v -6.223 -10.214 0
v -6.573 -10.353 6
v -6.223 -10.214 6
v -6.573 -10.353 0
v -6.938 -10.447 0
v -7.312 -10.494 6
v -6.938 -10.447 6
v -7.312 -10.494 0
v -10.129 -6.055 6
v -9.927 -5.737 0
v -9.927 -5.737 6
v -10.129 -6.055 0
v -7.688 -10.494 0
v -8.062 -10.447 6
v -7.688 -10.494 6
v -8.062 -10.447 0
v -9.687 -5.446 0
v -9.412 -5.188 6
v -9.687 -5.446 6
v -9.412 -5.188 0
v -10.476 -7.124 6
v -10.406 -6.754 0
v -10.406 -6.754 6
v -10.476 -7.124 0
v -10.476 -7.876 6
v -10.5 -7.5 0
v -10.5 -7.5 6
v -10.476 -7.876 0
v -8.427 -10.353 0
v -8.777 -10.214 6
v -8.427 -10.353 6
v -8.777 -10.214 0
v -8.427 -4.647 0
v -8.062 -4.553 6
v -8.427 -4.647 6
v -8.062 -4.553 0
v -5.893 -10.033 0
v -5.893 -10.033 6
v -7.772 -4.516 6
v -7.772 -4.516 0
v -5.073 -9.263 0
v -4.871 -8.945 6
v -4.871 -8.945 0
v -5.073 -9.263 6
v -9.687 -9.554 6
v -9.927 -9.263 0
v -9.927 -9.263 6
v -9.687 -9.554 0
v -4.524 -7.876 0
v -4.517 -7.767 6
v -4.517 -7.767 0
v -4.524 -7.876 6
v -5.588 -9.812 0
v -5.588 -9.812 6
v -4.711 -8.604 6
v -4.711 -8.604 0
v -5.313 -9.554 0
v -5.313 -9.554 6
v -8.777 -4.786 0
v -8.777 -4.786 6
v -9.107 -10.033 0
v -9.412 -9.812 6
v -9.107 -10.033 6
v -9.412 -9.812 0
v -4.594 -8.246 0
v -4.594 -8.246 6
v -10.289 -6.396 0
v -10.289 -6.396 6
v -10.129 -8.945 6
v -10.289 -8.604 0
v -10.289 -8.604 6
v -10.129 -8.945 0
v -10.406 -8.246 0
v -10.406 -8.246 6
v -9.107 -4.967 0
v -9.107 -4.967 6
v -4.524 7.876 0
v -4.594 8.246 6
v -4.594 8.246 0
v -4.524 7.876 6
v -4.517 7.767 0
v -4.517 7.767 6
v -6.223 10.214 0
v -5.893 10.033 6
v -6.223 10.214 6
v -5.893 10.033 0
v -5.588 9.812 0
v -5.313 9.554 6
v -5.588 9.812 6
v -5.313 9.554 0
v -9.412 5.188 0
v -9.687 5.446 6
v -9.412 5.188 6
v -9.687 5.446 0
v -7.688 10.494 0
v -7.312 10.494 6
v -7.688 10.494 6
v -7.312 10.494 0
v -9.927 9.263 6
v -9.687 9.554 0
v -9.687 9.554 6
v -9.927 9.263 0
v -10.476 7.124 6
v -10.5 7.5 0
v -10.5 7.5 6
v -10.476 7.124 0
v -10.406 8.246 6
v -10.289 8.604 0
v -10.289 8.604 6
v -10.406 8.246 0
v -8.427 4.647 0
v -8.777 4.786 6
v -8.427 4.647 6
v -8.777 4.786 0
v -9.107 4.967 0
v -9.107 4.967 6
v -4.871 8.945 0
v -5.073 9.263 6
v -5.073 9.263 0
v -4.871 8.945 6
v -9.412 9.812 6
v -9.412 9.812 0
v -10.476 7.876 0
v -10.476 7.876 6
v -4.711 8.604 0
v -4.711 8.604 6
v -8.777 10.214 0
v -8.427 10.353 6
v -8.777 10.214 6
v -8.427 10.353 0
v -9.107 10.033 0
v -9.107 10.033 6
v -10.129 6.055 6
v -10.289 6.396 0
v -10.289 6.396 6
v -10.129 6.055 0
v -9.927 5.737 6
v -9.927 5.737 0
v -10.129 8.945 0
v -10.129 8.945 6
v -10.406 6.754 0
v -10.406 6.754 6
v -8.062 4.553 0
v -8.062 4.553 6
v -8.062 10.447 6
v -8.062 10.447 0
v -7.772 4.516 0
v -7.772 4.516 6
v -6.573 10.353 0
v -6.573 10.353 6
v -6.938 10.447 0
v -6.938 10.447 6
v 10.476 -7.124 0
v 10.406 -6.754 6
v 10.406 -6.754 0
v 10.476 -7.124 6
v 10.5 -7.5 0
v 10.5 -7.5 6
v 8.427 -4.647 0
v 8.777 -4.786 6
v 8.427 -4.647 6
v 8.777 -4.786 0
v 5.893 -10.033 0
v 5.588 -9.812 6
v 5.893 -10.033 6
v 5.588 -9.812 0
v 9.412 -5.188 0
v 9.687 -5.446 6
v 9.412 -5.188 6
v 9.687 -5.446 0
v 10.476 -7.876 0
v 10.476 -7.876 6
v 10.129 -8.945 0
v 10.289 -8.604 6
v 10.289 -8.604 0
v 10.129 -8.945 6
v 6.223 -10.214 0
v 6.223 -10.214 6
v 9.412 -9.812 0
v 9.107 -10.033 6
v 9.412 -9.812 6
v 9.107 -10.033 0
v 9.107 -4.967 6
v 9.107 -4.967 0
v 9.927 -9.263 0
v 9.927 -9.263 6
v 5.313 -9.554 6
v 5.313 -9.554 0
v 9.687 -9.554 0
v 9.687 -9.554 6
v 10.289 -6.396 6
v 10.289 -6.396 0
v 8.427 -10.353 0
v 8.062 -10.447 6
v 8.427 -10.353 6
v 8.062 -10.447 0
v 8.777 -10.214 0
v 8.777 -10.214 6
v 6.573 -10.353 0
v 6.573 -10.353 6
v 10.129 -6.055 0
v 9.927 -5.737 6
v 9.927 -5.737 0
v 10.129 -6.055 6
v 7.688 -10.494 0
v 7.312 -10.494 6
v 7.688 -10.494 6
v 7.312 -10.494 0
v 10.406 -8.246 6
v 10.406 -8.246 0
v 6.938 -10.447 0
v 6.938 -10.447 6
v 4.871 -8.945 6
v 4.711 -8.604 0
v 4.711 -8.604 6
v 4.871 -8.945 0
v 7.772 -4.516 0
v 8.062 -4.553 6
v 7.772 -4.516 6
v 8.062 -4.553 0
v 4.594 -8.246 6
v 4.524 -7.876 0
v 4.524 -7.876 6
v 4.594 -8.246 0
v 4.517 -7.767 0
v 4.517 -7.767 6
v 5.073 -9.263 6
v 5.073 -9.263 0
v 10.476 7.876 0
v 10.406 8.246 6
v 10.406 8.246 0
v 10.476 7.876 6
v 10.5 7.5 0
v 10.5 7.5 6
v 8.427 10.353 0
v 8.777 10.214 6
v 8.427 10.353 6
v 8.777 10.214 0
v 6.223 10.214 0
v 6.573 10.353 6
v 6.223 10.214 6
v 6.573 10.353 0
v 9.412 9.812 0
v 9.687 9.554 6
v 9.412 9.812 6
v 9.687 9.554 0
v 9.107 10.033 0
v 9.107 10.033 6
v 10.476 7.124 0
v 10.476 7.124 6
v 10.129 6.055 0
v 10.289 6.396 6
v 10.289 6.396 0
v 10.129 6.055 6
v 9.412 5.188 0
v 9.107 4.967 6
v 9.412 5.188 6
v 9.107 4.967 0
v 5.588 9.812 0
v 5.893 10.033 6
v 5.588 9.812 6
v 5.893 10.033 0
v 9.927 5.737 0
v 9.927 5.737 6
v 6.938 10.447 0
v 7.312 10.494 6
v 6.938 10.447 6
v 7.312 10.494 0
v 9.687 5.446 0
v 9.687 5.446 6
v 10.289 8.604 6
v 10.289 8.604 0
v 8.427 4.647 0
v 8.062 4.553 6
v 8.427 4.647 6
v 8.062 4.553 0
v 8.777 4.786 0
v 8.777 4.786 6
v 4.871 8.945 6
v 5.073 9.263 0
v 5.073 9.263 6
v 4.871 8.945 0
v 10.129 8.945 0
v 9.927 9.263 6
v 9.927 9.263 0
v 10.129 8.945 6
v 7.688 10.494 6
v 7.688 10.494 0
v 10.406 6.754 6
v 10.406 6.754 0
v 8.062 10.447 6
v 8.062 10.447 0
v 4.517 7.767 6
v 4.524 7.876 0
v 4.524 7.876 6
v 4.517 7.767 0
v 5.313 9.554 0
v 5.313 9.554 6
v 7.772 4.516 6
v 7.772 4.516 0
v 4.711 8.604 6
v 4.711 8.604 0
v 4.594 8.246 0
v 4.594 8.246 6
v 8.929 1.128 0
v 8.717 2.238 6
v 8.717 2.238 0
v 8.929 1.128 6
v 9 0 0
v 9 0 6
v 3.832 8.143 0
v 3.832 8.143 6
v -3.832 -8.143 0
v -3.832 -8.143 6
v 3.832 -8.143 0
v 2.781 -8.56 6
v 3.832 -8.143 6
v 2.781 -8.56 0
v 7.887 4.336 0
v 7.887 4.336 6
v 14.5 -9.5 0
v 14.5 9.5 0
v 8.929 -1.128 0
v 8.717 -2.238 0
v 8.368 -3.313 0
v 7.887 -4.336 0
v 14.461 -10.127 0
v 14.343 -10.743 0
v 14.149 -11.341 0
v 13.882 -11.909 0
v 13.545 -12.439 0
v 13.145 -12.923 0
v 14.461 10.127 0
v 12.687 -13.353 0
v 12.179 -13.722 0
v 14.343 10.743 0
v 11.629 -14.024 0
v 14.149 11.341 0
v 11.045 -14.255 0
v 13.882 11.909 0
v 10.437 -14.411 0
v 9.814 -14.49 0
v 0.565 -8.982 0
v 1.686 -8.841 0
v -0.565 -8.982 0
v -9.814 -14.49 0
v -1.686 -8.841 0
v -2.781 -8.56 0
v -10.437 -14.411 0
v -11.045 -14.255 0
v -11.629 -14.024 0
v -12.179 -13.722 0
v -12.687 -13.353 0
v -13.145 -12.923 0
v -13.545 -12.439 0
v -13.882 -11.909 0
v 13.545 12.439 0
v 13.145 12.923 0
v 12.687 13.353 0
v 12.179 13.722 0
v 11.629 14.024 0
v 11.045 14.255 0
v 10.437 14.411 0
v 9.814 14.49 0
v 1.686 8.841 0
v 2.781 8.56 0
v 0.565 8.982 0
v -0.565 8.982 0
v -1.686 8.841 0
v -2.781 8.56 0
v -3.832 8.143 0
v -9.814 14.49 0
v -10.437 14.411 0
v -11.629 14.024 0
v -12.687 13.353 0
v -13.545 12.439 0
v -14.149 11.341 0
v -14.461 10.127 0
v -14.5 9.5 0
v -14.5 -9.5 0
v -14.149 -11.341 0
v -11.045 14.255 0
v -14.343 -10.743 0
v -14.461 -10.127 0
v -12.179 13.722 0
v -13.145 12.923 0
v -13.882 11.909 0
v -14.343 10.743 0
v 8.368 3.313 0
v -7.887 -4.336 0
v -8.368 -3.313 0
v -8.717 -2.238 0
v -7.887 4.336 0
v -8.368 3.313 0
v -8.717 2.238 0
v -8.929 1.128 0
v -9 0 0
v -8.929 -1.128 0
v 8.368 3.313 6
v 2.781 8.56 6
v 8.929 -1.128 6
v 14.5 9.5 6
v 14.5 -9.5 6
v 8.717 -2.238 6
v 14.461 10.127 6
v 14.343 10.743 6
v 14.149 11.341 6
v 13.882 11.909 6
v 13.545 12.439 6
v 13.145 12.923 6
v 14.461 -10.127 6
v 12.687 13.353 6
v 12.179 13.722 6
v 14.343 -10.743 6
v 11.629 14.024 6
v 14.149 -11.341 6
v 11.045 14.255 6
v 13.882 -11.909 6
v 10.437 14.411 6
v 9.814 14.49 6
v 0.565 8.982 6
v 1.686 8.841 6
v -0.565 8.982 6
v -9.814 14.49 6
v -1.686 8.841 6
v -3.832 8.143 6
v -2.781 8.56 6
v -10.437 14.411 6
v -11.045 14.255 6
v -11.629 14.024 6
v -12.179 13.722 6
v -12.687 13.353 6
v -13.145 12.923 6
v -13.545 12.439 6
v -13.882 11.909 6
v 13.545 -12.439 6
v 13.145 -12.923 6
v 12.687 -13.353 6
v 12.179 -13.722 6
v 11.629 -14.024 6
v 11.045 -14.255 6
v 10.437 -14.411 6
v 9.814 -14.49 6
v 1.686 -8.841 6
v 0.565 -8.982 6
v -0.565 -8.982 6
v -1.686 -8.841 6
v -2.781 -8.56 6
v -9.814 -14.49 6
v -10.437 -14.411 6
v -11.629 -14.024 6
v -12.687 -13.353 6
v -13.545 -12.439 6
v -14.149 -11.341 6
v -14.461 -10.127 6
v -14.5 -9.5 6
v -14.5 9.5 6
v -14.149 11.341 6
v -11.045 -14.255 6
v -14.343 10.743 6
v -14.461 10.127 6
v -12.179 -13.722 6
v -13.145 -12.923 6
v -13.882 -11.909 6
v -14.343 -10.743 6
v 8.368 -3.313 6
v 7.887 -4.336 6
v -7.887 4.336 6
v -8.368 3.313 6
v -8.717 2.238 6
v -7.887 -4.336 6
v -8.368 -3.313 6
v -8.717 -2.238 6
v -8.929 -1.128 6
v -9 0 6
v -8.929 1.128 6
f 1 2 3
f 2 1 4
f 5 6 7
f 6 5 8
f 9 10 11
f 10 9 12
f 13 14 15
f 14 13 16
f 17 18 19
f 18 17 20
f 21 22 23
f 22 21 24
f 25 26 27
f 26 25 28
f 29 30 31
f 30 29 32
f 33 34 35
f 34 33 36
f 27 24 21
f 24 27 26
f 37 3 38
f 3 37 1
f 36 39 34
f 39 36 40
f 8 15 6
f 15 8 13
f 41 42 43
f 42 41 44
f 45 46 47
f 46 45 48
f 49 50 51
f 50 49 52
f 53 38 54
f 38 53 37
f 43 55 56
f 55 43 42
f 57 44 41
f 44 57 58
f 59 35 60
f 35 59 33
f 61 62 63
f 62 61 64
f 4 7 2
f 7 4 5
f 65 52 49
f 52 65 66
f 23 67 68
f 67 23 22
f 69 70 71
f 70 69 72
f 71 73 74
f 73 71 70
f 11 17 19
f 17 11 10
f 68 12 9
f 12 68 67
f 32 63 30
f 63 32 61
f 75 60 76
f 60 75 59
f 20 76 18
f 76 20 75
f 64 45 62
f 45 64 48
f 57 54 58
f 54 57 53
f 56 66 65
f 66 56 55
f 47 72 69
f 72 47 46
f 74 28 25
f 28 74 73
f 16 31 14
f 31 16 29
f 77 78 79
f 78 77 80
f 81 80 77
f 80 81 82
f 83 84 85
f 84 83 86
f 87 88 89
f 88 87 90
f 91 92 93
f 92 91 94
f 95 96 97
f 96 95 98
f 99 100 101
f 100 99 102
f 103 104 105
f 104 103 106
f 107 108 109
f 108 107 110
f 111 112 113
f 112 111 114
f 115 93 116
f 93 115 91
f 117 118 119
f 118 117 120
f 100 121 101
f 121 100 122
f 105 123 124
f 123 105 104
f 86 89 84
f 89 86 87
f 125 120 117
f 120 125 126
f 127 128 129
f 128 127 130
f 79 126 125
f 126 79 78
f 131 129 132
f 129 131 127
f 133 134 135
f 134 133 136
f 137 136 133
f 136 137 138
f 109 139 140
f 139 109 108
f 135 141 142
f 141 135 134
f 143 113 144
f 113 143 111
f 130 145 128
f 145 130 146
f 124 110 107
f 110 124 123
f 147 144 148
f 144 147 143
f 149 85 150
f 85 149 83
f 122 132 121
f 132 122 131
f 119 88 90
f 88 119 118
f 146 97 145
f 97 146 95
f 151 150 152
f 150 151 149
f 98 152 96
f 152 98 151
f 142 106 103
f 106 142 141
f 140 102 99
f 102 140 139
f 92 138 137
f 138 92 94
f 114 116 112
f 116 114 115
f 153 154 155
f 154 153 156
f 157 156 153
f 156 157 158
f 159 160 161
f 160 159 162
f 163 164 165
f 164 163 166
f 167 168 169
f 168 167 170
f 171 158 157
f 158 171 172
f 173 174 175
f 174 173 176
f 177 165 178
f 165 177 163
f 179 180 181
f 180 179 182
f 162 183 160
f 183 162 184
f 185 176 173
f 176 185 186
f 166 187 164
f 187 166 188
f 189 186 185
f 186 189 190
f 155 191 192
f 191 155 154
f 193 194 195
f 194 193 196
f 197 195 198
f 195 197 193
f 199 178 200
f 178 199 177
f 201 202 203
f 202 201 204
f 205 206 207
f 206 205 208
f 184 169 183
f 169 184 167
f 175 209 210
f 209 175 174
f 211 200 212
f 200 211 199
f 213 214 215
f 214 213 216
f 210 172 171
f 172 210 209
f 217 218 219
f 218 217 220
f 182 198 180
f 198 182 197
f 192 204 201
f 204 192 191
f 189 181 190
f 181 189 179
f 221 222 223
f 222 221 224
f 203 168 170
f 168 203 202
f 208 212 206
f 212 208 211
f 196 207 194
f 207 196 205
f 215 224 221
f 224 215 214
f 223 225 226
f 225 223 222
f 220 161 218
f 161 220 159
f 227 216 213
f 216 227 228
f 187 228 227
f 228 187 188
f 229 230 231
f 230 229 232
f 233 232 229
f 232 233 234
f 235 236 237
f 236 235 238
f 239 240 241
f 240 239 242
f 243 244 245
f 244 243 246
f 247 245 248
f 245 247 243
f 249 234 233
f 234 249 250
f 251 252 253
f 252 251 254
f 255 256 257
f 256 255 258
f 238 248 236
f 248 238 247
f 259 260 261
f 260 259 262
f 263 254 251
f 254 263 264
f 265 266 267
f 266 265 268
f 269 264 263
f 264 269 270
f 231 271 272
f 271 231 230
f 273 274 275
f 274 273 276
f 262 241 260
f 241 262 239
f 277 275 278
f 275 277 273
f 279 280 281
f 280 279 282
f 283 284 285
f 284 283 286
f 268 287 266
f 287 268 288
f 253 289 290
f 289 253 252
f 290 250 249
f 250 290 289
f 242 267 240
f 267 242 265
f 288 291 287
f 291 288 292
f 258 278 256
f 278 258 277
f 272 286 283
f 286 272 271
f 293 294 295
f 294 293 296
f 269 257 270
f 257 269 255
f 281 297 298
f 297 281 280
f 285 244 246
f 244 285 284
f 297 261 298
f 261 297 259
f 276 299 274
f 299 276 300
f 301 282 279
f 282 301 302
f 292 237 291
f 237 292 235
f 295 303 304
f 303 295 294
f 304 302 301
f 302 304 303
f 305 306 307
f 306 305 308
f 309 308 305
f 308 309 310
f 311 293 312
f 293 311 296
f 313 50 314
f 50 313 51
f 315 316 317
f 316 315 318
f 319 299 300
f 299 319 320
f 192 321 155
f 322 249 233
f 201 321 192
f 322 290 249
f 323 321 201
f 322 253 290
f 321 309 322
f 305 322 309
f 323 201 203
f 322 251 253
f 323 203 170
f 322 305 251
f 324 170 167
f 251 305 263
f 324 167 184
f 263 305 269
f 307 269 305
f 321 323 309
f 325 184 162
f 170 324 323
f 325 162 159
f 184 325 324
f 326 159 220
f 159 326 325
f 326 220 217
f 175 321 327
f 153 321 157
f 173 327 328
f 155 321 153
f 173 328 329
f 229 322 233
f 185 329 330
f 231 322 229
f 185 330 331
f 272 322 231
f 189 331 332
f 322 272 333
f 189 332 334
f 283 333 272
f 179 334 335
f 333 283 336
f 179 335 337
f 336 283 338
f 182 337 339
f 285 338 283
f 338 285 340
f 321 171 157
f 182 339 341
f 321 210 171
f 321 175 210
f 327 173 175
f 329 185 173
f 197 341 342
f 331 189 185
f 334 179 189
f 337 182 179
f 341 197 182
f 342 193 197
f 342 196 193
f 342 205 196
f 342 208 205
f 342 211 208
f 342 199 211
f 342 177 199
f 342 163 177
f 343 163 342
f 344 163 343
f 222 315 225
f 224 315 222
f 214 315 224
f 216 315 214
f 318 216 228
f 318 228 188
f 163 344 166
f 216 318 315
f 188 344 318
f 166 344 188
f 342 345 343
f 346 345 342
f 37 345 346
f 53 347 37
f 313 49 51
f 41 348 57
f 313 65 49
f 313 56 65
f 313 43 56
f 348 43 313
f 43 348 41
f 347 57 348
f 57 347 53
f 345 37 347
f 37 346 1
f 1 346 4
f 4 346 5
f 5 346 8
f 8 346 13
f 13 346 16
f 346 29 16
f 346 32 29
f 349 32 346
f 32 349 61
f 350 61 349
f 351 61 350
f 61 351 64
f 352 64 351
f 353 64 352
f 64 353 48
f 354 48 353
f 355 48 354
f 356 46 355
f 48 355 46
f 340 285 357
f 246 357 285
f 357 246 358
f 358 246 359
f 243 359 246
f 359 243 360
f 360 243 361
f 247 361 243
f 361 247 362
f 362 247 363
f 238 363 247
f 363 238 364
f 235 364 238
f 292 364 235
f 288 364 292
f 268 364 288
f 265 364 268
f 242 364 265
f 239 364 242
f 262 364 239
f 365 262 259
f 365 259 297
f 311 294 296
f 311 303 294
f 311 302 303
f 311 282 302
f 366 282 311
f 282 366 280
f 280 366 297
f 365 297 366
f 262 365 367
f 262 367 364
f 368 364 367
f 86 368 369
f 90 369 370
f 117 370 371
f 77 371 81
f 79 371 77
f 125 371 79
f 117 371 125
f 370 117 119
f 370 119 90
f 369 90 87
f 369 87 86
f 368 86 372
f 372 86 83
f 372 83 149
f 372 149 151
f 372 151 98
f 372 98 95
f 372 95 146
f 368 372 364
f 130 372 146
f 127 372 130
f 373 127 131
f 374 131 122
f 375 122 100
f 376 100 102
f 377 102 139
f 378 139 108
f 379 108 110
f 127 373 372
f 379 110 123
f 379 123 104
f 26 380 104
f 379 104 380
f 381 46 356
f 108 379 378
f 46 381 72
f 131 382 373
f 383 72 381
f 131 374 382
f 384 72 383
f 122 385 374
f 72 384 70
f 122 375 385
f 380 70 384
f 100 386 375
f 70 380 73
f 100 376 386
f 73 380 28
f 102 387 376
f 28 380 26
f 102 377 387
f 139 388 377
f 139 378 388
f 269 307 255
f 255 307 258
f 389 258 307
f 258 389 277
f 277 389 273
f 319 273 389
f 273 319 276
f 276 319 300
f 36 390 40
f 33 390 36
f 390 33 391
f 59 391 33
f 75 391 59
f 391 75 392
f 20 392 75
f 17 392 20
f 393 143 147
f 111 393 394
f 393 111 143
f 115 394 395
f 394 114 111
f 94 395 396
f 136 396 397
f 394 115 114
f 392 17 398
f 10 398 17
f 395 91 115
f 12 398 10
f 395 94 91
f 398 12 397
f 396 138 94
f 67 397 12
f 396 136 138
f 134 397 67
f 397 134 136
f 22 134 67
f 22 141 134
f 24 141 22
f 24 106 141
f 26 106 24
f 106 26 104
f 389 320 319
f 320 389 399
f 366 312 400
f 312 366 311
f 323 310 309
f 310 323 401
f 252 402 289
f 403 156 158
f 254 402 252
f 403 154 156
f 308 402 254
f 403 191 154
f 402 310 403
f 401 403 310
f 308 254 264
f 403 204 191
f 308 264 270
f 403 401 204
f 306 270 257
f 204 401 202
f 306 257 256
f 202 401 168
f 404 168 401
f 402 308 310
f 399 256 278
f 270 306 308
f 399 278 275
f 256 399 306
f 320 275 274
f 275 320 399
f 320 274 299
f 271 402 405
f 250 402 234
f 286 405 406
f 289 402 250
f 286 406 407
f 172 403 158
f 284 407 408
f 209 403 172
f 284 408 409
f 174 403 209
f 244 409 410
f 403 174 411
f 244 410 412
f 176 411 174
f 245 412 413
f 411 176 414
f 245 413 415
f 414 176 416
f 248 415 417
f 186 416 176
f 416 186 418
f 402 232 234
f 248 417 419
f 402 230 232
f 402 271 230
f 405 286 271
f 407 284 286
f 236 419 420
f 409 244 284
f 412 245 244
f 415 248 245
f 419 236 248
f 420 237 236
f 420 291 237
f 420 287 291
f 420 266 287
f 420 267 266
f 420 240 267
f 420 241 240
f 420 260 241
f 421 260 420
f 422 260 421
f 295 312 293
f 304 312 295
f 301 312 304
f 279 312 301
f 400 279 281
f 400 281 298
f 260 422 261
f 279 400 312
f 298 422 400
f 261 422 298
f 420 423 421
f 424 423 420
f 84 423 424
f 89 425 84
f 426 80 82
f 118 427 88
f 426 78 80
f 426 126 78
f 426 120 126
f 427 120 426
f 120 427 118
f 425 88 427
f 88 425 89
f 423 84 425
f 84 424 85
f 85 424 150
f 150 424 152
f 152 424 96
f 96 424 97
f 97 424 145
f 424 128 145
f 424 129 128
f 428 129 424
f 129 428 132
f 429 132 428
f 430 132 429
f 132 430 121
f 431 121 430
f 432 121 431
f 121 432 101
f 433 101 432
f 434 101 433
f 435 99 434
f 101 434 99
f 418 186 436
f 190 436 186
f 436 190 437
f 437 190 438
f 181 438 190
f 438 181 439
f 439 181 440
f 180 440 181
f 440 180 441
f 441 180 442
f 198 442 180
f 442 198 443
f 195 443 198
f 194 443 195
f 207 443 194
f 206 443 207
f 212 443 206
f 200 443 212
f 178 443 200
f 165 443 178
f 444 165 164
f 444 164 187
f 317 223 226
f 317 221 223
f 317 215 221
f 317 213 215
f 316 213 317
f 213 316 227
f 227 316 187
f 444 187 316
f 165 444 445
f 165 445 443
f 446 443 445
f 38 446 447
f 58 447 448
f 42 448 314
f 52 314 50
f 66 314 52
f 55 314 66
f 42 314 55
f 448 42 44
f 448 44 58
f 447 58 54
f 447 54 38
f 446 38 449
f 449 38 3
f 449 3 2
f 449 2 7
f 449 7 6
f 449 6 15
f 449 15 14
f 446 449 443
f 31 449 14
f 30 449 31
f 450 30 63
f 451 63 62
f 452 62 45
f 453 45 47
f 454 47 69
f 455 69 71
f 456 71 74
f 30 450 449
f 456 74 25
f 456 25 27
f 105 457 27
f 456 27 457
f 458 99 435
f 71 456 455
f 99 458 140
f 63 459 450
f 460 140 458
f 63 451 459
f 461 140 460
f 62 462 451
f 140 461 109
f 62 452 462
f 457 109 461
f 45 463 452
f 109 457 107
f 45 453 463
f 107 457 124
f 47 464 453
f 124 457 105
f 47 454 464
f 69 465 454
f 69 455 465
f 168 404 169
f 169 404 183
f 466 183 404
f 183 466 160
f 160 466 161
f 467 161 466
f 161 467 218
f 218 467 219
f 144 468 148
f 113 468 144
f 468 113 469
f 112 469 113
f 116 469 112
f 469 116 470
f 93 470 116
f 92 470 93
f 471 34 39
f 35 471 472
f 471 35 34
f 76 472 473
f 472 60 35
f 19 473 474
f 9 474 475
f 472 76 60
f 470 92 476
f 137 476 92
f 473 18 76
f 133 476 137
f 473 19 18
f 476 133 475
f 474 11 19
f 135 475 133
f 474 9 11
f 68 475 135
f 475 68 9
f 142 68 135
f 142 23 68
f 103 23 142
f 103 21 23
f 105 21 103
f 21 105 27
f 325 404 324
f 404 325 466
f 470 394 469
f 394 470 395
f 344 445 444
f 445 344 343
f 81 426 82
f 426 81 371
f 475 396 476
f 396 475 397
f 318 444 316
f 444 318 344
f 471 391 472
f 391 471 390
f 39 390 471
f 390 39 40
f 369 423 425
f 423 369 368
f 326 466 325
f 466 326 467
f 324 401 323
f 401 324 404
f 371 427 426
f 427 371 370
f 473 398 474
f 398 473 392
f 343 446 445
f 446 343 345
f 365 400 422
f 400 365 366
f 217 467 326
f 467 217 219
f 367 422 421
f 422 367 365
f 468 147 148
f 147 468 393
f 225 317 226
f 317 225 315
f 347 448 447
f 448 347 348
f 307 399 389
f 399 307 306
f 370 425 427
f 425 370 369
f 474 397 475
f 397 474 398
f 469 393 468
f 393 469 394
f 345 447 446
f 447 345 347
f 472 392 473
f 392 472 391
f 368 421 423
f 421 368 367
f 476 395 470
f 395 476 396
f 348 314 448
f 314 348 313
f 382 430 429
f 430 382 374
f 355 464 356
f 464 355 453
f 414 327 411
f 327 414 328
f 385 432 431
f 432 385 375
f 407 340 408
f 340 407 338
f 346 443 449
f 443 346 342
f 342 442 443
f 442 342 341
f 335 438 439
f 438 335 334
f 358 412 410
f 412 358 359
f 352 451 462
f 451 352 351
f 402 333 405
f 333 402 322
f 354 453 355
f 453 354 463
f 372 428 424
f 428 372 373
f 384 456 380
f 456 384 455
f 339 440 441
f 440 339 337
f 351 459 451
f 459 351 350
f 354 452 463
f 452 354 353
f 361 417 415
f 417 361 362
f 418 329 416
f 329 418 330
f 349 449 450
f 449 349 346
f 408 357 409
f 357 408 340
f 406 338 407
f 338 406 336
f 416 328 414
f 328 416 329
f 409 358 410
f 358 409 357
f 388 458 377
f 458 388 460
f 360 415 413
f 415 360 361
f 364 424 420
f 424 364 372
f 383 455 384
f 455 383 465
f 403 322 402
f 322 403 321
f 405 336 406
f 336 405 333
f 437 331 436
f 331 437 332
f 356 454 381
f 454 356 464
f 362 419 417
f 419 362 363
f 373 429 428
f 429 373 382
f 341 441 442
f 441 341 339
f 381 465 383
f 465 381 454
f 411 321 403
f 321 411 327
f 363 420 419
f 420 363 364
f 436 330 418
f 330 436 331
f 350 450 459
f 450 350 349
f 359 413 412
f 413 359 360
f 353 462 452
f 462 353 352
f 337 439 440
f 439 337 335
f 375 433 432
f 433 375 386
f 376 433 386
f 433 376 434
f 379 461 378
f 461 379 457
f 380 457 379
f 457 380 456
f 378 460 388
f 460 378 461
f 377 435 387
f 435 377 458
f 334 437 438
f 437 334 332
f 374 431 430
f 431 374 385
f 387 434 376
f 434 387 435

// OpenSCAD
$fn = 50;


difference() {
	union() {
		hull() {
			translate(v = [-9.5000000000, 9.5000000000, 0]) {
				cylinder(h = 6, r = 5);
			}
			translate(v = [9.5000000000, 9.5000000000, 0]) {
				cylinder(h = 6, r = 5);
			}
			translate(v = [-9.5000000000, -9.5000000000, 0]) {
				cylinder(h = 6, r = 5);
			}
			translate(v = [9.5000000000, -9.5000000000, 0]) {
				cylinder(h = 6, r = 5);
			}
		}
	}
	union() {
		#translate(v = [-7.5000000000, -7.5000000000, -100.0000000000]) {
			cylinder(h = 200, r = 3.0000000000);
		}
		#translate(v = [-7.5000000000, 7.5000000000, -100.0000000000]) {
			cylinder(h = 200, r = 3.0000000000);
		}
		#translate(v = [7.5000000000, -7.5000000000, -100.0000000000]) {
			cylinder(h = 200, r = 3.0000000000);
		}
		#translate(v = [7.5000000000, 7.5000000000, -100.0000000000]) {
			cylinder(h = 200, r = 3.0000000000);
		}
		#cylinder(h = 6, r = 9.0000000000);
	}
}
